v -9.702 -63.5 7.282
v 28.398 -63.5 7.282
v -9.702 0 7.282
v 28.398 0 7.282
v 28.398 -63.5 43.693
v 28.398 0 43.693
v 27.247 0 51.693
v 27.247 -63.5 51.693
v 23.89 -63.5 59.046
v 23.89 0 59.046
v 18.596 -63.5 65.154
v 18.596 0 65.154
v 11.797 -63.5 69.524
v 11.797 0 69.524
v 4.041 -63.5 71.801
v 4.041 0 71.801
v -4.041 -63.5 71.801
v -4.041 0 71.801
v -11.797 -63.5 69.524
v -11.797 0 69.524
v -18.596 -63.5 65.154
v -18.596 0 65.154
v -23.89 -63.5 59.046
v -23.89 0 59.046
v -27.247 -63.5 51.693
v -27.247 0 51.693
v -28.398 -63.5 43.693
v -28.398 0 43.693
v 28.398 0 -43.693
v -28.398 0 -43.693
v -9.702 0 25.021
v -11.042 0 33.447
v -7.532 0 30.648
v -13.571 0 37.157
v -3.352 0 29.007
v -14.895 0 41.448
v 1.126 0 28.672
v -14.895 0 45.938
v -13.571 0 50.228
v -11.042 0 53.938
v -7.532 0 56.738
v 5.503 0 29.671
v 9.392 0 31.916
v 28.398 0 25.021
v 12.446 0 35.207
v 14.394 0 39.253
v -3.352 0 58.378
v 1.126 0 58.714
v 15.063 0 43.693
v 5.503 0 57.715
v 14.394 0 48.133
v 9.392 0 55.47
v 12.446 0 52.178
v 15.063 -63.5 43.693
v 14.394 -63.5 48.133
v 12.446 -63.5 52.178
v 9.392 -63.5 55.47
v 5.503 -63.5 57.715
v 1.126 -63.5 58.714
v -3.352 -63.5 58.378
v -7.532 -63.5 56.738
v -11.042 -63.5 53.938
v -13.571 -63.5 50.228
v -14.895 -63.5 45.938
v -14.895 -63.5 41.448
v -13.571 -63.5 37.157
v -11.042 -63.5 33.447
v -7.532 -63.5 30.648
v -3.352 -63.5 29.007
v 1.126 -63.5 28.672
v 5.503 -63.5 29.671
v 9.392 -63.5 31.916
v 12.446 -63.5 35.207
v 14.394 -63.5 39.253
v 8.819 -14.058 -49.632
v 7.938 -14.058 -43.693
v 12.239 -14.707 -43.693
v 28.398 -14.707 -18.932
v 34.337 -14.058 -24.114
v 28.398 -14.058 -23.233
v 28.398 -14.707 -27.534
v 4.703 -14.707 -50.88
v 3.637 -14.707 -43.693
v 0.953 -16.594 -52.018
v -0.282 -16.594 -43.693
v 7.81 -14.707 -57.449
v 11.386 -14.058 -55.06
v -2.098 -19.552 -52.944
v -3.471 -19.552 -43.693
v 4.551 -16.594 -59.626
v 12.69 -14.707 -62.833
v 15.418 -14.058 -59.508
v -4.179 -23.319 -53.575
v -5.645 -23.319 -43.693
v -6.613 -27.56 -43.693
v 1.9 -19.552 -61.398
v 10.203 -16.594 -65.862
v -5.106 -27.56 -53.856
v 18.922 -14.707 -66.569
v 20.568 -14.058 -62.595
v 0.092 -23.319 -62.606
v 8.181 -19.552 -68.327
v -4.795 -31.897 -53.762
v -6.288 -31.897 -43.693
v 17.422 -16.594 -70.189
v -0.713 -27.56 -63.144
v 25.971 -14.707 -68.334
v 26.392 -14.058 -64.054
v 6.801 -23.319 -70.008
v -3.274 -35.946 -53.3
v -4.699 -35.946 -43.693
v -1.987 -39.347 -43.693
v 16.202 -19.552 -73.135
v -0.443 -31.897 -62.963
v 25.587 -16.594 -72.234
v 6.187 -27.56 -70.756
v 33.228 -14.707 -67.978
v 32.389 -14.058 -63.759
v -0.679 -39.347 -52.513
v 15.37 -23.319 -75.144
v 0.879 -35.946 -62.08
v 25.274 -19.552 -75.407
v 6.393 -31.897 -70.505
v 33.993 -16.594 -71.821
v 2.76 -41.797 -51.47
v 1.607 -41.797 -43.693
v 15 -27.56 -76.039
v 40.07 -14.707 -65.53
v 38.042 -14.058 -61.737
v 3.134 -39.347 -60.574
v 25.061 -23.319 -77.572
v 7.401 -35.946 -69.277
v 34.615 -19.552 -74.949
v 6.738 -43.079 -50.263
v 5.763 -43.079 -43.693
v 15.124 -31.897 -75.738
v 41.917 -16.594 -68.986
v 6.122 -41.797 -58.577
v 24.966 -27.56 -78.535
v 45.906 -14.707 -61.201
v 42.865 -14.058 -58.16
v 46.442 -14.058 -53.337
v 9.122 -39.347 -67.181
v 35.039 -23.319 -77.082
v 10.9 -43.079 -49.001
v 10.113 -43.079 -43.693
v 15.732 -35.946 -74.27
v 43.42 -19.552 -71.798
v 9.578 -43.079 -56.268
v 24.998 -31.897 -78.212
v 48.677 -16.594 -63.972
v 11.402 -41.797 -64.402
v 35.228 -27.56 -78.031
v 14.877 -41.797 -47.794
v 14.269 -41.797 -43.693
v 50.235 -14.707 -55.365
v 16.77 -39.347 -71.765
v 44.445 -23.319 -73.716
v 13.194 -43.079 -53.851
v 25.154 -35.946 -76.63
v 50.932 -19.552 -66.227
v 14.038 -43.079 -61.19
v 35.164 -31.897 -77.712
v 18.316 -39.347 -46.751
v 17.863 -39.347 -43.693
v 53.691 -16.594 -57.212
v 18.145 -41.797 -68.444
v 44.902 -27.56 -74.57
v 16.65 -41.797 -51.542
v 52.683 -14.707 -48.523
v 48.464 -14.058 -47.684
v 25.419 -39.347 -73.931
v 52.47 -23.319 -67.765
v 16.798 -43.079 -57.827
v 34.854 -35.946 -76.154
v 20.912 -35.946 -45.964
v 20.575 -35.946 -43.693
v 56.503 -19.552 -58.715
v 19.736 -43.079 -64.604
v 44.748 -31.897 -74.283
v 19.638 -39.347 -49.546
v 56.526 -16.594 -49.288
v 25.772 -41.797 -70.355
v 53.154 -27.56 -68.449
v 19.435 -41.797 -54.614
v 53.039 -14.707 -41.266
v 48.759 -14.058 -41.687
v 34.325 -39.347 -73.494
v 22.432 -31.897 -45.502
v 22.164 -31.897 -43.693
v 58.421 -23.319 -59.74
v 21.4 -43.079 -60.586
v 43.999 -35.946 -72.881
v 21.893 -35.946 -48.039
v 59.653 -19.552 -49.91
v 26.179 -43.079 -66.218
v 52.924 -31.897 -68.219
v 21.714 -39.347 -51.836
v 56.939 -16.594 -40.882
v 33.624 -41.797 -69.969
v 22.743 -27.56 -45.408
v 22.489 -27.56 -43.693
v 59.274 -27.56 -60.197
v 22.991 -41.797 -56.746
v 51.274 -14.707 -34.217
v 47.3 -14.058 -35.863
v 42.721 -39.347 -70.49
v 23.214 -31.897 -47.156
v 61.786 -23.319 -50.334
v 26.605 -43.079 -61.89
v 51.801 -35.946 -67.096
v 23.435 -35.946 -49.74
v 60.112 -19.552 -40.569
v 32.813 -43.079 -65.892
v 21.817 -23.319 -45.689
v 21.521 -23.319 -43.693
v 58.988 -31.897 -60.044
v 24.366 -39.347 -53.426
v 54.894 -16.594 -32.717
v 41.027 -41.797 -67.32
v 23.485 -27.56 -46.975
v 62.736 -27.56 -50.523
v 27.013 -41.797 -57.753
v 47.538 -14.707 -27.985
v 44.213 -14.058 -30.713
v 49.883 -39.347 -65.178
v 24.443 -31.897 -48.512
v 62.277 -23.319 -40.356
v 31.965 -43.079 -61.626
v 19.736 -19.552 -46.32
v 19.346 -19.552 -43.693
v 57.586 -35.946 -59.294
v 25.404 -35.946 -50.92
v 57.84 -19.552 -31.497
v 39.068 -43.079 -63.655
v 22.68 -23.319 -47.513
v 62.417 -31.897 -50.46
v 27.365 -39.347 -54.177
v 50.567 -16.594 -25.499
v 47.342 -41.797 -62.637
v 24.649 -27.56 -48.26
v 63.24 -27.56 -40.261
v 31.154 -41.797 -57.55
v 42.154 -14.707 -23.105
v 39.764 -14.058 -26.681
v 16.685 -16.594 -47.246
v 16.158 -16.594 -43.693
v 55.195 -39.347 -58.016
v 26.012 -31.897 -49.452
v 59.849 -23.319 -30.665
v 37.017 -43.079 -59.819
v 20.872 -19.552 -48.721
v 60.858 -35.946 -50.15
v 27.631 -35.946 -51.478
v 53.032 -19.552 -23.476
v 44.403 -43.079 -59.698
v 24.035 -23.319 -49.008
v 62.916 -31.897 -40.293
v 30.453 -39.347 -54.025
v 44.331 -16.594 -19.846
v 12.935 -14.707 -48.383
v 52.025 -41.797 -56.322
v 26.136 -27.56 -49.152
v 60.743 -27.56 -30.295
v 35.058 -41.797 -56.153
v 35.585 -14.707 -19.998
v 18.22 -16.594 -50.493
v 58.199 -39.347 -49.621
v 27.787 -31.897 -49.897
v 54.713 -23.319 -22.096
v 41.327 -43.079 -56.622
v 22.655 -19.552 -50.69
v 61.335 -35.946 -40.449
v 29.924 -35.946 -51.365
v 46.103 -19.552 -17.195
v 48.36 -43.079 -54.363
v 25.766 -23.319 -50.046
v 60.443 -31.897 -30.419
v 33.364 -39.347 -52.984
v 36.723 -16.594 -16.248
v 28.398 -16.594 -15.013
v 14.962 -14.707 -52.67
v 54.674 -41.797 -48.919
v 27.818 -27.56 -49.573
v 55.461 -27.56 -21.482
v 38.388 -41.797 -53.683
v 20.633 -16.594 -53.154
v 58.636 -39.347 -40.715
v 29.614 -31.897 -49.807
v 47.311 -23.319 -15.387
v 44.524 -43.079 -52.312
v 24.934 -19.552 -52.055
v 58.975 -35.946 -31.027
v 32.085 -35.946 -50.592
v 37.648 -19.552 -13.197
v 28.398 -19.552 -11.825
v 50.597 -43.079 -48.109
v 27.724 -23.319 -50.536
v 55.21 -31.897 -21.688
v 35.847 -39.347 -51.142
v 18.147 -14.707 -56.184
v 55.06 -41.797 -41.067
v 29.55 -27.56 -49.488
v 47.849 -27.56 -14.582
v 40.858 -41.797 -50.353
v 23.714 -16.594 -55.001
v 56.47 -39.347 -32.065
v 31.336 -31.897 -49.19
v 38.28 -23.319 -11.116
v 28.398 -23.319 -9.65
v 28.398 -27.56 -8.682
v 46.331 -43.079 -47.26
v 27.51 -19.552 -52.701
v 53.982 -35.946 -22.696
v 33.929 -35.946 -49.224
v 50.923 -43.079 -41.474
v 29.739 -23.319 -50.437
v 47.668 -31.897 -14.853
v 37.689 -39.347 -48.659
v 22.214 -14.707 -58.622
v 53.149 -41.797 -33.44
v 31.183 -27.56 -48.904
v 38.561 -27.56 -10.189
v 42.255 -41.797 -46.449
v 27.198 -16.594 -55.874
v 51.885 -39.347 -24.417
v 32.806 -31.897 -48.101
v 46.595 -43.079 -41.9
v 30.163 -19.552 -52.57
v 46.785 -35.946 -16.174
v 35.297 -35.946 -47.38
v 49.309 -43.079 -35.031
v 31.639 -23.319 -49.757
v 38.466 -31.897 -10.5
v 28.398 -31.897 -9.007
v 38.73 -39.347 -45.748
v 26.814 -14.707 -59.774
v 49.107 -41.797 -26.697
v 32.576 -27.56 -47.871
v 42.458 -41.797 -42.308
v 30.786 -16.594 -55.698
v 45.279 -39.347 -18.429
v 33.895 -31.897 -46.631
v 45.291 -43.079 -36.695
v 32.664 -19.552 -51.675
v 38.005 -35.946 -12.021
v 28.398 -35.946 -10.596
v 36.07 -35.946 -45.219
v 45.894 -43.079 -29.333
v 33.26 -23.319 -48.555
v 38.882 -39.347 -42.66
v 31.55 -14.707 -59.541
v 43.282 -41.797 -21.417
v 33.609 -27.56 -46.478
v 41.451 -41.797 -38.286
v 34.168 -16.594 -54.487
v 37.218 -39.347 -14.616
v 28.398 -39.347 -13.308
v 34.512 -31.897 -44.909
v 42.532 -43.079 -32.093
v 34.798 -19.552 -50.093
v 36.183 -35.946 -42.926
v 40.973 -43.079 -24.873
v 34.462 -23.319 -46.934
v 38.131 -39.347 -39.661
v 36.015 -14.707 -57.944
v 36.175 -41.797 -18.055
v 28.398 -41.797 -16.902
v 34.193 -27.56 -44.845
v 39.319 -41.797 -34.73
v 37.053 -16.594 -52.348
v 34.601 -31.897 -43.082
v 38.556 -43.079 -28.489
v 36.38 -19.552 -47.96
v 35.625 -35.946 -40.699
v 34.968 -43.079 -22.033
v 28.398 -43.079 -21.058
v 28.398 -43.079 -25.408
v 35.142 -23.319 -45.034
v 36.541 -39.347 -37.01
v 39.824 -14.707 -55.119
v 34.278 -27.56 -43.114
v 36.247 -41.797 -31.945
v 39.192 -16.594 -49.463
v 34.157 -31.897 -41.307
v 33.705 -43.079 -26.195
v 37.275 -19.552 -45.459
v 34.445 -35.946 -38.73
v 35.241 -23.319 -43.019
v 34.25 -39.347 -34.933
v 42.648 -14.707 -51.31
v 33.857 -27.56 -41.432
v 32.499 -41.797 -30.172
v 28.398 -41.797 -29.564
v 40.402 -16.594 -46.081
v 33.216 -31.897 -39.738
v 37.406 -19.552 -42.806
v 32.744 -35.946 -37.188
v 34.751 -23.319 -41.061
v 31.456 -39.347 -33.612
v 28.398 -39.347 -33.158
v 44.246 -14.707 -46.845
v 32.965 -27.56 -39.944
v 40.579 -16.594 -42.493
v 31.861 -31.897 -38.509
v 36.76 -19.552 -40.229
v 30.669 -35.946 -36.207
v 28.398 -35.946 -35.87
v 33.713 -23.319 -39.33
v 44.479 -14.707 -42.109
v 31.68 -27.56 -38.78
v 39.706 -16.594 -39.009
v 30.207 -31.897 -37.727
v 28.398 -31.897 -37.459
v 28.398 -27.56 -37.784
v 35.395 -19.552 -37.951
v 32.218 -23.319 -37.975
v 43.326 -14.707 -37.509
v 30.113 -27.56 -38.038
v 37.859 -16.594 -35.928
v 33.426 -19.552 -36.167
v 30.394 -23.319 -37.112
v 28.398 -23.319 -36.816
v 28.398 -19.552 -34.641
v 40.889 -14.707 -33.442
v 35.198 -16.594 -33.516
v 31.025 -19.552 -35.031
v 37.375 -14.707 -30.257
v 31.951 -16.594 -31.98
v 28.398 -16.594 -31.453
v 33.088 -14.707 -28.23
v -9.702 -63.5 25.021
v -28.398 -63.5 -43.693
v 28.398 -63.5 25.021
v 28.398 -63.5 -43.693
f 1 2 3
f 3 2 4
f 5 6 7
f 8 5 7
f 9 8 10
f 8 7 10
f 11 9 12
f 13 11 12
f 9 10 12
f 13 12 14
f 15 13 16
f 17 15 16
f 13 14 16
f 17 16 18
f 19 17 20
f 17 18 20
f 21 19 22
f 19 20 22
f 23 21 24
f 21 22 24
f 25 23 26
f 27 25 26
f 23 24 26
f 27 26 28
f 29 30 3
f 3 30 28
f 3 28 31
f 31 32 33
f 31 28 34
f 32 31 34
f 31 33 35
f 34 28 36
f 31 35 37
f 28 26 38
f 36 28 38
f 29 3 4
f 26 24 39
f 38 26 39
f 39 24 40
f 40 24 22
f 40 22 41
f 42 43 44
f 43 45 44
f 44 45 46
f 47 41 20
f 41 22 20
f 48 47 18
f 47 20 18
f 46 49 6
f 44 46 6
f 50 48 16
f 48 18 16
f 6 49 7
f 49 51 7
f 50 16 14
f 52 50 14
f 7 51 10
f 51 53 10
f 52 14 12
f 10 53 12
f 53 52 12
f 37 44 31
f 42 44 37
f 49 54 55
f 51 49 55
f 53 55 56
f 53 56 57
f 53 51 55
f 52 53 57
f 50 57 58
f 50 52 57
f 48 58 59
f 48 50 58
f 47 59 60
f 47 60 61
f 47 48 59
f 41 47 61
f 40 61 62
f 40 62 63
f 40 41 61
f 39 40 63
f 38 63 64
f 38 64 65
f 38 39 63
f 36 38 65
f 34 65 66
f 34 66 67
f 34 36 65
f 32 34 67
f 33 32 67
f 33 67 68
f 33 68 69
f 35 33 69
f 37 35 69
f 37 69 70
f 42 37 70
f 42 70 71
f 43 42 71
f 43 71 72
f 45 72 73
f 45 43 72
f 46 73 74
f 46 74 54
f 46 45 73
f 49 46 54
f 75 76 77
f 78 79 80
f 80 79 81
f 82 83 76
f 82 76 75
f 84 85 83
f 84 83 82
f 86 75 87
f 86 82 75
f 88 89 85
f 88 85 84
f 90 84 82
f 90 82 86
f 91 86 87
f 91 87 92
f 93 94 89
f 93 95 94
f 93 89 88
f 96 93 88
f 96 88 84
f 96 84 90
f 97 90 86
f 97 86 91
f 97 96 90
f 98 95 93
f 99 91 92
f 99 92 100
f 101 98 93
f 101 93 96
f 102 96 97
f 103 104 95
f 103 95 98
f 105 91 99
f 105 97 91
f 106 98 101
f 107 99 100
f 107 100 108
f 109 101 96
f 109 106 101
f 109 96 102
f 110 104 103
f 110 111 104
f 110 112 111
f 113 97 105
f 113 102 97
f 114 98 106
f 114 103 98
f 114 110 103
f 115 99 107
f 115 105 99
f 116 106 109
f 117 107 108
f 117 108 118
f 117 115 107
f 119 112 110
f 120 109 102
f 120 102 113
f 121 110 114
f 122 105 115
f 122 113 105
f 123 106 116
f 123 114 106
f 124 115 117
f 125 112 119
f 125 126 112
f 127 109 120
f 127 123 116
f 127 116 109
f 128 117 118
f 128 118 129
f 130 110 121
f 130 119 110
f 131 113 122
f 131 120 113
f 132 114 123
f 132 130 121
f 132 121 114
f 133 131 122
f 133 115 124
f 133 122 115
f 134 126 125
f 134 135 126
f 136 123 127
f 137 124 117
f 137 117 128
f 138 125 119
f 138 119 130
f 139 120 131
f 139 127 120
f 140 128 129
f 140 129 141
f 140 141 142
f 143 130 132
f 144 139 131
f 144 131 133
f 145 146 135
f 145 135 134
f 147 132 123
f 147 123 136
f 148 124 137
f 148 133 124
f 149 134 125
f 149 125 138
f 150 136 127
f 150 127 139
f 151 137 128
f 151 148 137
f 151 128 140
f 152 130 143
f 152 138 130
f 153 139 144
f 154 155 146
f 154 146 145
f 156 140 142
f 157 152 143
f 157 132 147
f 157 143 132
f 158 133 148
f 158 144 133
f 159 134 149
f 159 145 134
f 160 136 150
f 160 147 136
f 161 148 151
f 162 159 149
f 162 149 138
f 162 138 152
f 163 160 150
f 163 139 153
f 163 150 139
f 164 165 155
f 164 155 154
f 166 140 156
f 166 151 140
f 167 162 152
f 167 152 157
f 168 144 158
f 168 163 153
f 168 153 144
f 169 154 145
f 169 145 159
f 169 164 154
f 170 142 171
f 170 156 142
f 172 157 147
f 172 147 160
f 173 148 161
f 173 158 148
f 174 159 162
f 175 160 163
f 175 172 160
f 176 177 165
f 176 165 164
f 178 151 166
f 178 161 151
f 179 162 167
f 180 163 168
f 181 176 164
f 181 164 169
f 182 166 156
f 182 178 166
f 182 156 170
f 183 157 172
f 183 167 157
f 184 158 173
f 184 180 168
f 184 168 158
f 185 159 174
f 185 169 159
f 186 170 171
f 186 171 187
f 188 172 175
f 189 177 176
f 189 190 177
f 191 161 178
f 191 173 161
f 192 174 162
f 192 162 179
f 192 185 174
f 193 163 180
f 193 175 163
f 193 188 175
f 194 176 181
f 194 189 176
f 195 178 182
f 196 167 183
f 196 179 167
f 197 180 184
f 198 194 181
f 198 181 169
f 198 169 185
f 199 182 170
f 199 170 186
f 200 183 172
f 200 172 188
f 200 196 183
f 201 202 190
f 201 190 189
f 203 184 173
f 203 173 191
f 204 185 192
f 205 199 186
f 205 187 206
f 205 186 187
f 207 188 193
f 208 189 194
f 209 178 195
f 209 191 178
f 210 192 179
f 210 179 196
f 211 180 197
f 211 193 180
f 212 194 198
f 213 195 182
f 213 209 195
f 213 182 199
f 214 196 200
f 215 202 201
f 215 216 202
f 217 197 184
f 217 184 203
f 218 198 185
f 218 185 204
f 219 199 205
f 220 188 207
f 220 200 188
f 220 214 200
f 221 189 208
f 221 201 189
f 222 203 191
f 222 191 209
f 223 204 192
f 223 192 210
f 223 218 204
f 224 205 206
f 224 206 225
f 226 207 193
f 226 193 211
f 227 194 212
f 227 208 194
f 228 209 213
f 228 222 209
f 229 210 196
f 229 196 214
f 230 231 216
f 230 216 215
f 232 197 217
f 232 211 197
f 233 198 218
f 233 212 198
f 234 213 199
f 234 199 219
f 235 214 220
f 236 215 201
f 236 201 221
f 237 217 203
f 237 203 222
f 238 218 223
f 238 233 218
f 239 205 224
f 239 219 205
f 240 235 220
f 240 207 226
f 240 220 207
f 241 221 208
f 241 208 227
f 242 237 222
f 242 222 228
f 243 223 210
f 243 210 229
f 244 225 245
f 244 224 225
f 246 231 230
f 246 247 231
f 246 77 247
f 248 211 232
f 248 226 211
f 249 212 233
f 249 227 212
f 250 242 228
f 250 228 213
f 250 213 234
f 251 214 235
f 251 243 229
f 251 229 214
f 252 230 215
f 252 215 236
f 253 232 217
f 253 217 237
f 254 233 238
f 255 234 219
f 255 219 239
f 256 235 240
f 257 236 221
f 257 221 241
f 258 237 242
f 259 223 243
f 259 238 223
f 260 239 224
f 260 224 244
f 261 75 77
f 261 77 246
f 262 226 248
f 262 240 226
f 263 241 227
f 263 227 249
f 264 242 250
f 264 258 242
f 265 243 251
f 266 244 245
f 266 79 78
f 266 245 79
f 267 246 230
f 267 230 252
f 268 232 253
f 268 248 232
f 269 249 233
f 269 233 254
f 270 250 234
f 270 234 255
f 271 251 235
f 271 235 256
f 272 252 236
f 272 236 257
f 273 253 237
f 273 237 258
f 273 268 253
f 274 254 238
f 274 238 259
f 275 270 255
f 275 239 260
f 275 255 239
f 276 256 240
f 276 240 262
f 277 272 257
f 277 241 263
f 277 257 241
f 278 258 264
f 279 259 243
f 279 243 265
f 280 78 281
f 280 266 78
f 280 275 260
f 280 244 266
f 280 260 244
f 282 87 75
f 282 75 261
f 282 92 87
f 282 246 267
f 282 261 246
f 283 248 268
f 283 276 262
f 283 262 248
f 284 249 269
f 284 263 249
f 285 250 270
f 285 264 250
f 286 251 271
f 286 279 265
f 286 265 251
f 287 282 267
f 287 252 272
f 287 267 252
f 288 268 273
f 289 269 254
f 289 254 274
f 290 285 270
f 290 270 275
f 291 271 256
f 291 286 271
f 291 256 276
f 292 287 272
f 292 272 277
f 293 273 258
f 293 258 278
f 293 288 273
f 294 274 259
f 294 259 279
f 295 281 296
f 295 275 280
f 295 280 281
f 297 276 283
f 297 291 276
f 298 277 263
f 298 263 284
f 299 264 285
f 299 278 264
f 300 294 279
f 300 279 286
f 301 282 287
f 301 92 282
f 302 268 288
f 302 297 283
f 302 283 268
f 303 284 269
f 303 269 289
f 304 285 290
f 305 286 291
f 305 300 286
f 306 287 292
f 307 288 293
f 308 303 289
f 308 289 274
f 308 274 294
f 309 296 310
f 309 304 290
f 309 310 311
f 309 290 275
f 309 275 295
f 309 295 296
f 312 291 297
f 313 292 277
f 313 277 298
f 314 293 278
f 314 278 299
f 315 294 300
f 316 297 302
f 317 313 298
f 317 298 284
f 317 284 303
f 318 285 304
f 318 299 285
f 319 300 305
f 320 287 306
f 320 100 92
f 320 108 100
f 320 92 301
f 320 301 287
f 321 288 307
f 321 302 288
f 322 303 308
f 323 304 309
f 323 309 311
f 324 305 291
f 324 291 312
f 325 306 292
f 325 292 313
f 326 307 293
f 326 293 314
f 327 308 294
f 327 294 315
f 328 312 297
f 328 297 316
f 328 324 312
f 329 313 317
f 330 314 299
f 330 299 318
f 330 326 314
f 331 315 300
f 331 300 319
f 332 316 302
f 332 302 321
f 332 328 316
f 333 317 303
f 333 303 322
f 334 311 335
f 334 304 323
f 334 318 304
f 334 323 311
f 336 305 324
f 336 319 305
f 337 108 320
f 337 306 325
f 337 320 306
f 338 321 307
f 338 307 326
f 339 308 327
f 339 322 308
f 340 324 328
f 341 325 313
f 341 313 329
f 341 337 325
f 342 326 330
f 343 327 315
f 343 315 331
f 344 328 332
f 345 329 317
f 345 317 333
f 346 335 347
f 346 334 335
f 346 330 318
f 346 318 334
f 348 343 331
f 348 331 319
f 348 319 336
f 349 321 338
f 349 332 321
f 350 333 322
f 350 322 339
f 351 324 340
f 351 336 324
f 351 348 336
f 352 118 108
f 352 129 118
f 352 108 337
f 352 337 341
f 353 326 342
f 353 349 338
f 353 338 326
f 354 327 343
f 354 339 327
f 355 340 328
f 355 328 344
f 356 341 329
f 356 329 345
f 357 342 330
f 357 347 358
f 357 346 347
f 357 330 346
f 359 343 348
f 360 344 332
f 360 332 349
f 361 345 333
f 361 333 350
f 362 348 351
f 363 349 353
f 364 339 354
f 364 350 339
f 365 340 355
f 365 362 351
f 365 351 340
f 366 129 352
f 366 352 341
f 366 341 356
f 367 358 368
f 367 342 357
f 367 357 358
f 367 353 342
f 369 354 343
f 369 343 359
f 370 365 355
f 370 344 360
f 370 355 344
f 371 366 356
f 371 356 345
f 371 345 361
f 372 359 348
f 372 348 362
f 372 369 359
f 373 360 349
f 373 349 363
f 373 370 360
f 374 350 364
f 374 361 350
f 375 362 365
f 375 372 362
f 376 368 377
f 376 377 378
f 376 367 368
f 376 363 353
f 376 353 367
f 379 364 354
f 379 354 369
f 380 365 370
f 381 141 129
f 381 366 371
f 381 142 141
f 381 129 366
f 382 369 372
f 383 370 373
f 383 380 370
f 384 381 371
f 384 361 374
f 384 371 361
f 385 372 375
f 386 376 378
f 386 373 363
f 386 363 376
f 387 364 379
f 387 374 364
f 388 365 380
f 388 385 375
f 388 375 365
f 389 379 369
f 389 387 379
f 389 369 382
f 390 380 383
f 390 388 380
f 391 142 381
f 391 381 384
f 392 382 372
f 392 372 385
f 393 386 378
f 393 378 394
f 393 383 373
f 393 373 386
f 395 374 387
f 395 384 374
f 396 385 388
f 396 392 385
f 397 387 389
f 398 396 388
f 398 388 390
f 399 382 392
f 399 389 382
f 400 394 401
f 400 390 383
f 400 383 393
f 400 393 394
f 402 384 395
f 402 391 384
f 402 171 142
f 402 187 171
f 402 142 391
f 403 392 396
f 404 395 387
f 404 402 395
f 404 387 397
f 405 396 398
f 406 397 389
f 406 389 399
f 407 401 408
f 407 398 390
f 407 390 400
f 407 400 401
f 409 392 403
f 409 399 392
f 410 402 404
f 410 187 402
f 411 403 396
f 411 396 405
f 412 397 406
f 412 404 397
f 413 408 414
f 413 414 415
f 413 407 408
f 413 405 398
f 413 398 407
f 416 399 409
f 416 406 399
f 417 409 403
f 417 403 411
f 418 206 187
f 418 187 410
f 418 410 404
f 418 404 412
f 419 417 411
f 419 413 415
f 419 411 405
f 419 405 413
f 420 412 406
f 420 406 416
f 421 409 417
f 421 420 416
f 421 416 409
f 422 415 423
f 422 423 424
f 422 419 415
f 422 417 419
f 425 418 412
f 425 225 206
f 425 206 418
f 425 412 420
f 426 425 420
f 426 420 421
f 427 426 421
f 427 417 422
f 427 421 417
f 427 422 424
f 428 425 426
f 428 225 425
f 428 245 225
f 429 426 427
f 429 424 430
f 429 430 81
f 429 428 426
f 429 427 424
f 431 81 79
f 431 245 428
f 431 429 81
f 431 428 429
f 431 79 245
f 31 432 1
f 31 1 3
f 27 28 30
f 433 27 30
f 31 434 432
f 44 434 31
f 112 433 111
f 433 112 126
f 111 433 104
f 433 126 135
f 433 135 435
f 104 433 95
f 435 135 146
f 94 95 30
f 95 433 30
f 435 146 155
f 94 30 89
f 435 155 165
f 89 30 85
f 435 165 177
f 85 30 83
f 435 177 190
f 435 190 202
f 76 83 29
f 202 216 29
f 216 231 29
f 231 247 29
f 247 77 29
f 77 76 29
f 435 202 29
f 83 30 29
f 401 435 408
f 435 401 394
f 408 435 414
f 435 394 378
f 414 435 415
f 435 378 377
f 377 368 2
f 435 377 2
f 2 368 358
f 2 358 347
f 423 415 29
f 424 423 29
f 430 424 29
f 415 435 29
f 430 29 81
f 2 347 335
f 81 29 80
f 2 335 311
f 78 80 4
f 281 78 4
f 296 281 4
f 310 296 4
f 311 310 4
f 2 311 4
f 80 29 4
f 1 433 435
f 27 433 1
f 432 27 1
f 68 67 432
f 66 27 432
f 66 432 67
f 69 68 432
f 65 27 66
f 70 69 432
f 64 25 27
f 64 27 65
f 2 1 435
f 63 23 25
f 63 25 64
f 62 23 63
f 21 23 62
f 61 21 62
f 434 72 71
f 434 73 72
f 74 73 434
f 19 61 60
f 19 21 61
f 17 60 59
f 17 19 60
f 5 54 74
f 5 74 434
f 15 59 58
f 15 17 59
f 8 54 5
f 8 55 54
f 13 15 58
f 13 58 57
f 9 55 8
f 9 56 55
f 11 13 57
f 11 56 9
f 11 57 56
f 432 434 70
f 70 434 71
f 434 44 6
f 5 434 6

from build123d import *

# Parameters (mm, degrees)
F0_R     = 15.063186
F1_DEPTH = 63.5
F2_W     = 63.5
F2_H     = 17.738506
F3_DEPTH = 38.1
F4_R     = 14.591835


with BuildPart() as f1:
    # F0 (on Front) → F1 (new body)
    with BuildSketch(Plane.XZ):
        with BuildLine():
            Line((-28.397631, -43.692742), (28.397631, -43.692742))
            Line((28.397631, -43.692742), (28.397631, 43.692742))
            ThreePointArc((28.397631, 43.692742), (0, 72.090372), (-28.397631, 43.692742))
            Line((-28.397631, 43.692742), (-28.397631, -43.692742))
        make_face()
        with Locations((0, 43.692742)):
            Circle(F0_R, mode=Mode.SUBTRACT)
    extrude(amount=F1_DEPTH)

    # F2 (on face) → F3 (cut)
    with BuildSketch(Plane.YZ.offset(28.397631)):
        with Locations((-31.75, 16.151376)):
            Rectangle(F2_W, F2_H)
    extrude(amount=-F3_DEPTH, mode=Mode.SUBTRACT)

    # F4 (on face) → F5 (revolve)
    with BuildSketch(Plane.YZ.offset(28.397631)):
        with Locations((-28.650237, -23.23292)):
            Circle(F4_R)
    revolve(axis=Axis((28.397631, -31.75, -43.692742), (0, -1, 0)))


solid = f1.part
